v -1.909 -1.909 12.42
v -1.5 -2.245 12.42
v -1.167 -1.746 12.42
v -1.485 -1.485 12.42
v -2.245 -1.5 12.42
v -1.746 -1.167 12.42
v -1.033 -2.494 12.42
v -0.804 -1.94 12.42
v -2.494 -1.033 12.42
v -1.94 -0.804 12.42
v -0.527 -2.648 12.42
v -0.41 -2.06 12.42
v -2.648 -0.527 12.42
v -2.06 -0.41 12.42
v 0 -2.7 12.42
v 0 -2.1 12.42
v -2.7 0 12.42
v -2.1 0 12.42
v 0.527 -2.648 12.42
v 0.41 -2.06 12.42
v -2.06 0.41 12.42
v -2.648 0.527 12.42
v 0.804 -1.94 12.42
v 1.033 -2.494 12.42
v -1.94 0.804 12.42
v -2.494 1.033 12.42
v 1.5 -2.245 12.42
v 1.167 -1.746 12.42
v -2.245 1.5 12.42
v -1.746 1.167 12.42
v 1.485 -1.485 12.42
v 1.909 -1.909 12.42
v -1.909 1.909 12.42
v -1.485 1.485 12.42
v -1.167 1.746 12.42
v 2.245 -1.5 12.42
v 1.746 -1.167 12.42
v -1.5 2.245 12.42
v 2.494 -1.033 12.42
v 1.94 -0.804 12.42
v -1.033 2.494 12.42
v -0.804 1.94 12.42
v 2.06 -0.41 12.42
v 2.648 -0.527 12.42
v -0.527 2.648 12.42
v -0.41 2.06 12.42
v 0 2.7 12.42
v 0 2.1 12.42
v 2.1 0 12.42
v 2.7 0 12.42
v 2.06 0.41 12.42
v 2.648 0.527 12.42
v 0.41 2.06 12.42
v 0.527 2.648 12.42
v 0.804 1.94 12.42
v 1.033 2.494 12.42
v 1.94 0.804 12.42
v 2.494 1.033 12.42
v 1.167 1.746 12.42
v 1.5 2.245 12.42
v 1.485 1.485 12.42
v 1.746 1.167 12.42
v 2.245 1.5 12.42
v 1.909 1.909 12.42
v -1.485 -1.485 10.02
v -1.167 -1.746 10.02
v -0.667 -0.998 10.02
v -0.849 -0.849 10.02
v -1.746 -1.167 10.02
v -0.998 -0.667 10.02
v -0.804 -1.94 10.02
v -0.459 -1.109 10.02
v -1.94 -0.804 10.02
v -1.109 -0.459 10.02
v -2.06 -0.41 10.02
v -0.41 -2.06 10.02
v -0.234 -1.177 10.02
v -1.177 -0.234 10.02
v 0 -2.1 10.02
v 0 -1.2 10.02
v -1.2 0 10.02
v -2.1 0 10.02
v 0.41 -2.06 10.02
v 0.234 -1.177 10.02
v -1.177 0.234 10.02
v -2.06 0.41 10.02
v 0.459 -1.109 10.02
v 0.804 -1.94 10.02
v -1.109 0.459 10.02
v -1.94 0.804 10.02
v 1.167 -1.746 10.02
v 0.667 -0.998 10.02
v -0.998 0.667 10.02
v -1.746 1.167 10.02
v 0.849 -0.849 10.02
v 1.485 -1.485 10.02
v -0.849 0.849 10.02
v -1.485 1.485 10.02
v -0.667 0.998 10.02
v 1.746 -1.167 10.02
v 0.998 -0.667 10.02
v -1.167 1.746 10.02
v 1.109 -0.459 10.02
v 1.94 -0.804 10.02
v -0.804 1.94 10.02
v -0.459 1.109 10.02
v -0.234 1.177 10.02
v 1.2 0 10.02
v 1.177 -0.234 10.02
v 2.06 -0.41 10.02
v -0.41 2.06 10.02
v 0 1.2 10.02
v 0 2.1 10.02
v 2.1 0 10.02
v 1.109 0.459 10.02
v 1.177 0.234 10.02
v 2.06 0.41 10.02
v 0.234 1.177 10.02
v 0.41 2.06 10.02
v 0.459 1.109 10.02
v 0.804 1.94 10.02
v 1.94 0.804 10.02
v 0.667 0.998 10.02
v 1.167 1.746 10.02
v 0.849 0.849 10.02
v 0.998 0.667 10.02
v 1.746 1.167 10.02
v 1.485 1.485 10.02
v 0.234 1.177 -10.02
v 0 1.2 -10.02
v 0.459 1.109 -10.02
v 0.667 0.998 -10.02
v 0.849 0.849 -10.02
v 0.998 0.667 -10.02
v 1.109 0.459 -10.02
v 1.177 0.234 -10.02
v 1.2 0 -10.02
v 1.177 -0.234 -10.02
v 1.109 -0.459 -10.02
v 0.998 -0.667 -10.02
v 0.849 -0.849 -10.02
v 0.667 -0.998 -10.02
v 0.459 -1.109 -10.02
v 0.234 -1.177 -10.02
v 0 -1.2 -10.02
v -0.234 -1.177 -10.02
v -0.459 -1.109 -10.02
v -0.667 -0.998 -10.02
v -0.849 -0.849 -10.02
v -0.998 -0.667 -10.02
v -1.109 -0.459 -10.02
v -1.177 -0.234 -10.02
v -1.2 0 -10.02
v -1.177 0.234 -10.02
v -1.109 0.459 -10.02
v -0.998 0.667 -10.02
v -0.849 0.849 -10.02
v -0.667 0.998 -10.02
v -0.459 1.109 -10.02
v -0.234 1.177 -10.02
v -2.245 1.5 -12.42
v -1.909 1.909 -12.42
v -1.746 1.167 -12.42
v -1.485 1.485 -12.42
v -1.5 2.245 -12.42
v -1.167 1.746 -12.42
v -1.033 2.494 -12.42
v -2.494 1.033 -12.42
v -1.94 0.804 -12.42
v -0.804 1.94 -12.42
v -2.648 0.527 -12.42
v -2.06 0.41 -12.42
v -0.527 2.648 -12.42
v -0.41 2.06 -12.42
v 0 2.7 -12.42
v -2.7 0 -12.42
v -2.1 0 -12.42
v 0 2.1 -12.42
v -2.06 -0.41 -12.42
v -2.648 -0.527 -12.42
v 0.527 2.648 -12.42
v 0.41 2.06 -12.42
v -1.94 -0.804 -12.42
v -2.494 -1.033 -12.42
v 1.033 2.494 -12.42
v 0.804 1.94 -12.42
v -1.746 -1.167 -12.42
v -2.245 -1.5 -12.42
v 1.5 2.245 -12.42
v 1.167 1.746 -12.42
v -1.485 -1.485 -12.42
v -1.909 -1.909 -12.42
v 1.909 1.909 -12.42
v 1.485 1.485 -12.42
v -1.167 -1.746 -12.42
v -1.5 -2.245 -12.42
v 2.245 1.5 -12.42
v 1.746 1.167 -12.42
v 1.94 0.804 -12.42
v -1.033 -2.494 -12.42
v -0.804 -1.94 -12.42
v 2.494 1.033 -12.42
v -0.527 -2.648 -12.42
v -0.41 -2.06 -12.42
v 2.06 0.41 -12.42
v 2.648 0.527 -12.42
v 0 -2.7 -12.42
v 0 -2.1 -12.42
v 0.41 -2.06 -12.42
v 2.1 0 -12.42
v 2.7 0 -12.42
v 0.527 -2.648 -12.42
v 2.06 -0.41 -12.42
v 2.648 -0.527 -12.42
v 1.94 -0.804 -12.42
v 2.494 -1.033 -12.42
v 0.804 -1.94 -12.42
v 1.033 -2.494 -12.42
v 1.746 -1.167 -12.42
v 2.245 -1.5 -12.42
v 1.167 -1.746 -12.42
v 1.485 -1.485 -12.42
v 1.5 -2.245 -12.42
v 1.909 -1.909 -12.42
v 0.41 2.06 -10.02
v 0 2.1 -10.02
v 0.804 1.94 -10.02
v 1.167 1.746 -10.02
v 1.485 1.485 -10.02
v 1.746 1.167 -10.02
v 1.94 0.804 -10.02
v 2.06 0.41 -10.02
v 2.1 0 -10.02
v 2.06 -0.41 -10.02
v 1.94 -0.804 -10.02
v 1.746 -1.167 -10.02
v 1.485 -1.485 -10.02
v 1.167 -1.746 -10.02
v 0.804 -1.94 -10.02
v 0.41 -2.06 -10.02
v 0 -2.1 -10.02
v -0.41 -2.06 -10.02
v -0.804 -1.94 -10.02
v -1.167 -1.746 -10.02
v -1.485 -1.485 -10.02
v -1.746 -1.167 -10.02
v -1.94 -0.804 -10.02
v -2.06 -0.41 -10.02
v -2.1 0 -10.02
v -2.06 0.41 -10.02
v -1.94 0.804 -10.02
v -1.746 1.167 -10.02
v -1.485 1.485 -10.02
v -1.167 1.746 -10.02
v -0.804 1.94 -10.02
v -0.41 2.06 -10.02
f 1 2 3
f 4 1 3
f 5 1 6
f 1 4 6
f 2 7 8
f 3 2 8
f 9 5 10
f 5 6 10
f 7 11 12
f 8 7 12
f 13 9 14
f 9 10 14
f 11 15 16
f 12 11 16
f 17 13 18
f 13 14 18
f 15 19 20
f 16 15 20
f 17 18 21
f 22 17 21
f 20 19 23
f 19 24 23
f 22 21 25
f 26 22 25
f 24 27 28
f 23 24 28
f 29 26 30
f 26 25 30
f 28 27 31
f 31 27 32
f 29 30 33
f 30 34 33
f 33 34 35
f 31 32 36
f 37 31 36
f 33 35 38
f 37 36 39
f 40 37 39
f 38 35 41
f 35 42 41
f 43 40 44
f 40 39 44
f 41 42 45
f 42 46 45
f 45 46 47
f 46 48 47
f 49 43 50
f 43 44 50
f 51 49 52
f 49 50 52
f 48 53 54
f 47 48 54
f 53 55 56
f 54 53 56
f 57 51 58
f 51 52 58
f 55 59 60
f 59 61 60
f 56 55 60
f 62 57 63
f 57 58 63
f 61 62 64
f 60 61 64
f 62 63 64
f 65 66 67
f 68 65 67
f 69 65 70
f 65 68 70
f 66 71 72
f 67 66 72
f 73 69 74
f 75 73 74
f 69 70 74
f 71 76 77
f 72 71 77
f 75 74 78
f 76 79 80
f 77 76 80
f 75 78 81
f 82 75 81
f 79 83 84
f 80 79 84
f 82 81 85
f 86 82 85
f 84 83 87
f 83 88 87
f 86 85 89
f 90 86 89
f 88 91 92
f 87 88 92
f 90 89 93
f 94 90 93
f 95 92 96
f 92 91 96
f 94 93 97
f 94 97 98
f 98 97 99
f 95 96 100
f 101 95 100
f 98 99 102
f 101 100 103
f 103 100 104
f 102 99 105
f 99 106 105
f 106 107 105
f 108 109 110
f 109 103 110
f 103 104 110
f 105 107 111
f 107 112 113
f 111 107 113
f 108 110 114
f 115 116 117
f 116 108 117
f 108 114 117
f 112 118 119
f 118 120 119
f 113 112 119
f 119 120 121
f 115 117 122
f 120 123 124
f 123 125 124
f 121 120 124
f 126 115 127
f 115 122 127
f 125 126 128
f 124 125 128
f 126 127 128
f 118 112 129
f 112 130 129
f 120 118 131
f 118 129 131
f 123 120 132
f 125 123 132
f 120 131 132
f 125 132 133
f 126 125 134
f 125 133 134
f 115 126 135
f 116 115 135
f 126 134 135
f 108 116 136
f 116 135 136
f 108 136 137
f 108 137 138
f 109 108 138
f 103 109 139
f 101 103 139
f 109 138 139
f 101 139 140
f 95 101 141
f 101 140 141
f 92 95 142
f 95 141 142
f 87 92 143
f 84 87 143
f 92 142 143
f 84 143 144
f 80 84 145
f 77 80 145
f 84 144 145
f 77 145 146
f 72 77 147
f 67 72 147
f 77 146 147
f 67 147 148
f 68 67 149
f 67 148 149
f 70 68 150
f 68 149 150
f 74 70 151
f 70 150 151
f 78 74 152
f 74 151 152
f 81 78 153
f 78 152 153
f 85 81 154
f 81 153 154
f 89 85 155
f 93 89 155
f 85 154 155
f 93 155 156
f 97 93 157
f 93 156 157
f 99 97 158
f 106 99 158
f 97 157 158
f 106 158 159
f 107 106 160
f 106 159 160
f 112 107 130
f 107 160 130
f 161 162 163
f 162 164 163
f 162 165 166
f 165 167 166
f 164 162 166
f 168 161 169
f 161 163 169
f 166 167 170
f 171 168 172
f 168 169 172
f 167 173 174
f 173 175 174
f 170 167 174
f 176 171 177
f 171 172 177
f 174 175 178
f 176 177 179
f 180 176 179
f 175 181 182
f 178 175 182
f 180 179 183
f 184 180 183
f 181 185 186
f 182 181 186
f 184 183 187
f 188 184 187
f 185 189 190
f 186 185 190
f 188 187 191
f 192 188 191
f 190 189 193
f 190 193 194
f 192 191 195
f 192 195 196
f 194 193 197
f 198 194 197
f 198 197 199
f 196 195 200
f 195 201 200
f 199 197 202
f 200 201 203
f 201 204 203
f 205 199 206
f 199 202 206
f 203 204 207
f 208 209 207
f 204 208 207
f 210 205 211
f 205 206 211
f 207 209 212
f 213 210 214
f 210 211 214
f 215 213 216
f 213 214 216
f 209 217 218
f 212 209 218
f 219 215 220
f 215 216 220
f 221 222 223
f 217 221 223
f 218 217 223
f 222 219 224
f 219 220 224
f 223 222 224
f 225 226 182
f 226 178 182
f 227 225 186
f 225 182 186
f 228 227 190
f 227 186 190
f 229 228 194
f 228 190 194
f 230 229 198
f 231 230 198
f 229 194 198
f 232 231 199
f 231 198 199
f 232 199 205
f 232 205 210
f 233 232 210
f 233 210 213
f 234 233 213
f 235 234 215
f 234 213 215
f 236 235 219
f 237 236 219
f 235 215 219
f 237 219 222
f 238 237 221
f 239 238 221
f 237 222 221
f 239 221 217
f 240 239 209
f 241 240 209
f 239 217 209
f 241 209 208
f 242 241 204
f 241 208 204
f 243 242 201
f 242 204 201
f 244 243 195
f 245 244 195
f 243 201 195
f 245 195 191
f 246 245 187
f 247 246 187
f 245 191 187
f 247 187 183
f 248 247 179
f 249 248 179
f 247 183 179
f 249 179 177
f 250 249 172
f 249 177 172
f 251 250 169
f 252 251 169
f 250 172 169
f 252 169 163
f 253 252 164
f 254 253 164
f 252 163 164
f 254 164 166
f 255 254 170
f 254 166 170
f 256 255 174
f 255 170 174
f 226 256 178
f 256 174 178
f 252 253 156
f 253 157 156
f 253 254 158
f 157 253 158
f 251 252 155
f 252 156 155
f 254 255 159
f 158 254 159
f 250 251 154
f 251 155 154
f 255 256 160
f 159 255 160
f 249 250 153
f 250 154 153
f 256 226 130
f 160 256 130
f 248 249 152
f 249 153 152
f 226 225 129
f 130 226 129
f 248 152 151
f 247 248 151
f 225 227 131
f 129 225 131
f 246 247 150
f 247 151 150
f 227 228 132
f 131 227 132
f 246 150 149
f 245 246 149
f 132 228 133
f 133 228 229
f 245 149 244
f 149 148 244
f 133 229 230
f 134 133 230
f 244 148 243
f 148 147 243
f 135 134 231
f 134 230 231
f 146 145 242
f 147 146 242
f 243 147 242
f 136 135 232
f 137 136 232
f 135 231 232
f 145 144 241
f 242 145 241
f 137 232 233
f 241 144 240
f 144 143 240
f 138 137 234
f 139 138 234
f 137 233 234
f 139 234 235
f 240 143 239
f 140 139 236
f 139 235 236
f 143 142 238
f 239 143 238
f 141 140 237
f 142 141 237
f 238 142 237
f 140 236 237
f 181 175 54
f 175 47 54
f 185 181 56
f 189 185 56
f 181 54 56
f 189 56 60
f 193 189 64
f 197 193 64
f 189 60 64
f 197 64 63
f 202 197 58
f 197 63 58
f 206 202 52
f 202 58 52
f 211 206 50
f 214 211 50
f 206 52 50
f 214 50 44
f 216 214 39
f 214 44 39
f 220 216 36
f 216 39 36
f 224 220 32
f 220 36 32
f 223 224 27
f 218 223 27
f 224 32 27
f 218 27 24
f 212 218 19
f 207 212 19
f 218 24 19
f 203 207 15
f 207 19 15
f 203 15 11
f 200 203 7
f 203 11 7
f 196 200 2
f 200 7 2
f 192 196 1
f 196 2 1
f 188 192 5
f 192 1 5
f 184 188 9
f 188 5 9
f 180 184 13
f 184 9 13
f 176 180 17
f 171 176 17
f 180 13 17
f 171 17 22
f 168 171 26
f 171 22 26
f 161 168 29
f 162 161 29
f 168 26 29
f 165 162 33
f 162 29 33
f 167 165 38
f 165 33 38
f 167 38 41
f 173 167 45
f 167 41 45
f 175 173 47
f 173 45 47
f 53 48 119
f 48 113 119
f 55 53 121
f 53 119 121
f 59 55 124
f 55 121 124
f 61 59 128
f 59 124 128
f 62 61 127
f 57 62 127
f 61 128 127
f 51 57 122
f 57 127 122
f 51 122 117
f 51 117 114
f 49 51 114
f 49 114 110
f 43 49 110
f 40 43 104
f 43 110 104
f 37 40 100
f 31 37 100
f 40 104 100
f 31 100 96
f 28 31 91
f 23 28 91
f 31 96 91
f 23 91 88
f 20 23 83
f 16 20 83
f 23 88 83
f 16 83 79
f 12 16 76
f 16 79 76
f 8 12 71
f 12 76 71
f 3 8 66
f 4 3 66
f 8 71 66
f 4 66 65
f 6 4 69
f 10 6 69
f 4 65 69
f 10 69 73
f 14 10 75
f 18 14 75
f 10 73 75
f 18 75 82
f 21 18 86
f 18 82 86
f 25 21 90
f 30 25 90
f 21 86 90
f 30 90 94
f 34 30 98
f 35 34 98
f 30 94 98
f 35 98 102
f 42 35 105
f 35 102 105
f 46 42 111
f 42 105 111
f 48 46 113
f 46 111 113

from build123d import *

# Parameters (mm, degrees)
SCALE1_SCALE = 0.6


with BuildPart() as part:
    # Sketch1 → Revolve1 (revolve)
    with BuildSketch(Plane(origin=(0, 0, 0), x_dir=(0, 0, -1), z_dir=(1, 0, 0))):
        Polygon((16.7, 3.5), (20.7, 3.5), (20.7, 4.5), (-20.7, 4.5), (-20.7, 3.5), (-16.7, 3.5), (-16.7, 2), (16.7, 2), align=None)
    revolve(axis=Axis((0, 0, 16.930047934), (0, 0, -1)))


with BuildPart() as part_1:
    # Scale1: scaled about (0, 0, 0)
    add(part.part.scale(SCALE1_SCALE))


solid = part_1.part
